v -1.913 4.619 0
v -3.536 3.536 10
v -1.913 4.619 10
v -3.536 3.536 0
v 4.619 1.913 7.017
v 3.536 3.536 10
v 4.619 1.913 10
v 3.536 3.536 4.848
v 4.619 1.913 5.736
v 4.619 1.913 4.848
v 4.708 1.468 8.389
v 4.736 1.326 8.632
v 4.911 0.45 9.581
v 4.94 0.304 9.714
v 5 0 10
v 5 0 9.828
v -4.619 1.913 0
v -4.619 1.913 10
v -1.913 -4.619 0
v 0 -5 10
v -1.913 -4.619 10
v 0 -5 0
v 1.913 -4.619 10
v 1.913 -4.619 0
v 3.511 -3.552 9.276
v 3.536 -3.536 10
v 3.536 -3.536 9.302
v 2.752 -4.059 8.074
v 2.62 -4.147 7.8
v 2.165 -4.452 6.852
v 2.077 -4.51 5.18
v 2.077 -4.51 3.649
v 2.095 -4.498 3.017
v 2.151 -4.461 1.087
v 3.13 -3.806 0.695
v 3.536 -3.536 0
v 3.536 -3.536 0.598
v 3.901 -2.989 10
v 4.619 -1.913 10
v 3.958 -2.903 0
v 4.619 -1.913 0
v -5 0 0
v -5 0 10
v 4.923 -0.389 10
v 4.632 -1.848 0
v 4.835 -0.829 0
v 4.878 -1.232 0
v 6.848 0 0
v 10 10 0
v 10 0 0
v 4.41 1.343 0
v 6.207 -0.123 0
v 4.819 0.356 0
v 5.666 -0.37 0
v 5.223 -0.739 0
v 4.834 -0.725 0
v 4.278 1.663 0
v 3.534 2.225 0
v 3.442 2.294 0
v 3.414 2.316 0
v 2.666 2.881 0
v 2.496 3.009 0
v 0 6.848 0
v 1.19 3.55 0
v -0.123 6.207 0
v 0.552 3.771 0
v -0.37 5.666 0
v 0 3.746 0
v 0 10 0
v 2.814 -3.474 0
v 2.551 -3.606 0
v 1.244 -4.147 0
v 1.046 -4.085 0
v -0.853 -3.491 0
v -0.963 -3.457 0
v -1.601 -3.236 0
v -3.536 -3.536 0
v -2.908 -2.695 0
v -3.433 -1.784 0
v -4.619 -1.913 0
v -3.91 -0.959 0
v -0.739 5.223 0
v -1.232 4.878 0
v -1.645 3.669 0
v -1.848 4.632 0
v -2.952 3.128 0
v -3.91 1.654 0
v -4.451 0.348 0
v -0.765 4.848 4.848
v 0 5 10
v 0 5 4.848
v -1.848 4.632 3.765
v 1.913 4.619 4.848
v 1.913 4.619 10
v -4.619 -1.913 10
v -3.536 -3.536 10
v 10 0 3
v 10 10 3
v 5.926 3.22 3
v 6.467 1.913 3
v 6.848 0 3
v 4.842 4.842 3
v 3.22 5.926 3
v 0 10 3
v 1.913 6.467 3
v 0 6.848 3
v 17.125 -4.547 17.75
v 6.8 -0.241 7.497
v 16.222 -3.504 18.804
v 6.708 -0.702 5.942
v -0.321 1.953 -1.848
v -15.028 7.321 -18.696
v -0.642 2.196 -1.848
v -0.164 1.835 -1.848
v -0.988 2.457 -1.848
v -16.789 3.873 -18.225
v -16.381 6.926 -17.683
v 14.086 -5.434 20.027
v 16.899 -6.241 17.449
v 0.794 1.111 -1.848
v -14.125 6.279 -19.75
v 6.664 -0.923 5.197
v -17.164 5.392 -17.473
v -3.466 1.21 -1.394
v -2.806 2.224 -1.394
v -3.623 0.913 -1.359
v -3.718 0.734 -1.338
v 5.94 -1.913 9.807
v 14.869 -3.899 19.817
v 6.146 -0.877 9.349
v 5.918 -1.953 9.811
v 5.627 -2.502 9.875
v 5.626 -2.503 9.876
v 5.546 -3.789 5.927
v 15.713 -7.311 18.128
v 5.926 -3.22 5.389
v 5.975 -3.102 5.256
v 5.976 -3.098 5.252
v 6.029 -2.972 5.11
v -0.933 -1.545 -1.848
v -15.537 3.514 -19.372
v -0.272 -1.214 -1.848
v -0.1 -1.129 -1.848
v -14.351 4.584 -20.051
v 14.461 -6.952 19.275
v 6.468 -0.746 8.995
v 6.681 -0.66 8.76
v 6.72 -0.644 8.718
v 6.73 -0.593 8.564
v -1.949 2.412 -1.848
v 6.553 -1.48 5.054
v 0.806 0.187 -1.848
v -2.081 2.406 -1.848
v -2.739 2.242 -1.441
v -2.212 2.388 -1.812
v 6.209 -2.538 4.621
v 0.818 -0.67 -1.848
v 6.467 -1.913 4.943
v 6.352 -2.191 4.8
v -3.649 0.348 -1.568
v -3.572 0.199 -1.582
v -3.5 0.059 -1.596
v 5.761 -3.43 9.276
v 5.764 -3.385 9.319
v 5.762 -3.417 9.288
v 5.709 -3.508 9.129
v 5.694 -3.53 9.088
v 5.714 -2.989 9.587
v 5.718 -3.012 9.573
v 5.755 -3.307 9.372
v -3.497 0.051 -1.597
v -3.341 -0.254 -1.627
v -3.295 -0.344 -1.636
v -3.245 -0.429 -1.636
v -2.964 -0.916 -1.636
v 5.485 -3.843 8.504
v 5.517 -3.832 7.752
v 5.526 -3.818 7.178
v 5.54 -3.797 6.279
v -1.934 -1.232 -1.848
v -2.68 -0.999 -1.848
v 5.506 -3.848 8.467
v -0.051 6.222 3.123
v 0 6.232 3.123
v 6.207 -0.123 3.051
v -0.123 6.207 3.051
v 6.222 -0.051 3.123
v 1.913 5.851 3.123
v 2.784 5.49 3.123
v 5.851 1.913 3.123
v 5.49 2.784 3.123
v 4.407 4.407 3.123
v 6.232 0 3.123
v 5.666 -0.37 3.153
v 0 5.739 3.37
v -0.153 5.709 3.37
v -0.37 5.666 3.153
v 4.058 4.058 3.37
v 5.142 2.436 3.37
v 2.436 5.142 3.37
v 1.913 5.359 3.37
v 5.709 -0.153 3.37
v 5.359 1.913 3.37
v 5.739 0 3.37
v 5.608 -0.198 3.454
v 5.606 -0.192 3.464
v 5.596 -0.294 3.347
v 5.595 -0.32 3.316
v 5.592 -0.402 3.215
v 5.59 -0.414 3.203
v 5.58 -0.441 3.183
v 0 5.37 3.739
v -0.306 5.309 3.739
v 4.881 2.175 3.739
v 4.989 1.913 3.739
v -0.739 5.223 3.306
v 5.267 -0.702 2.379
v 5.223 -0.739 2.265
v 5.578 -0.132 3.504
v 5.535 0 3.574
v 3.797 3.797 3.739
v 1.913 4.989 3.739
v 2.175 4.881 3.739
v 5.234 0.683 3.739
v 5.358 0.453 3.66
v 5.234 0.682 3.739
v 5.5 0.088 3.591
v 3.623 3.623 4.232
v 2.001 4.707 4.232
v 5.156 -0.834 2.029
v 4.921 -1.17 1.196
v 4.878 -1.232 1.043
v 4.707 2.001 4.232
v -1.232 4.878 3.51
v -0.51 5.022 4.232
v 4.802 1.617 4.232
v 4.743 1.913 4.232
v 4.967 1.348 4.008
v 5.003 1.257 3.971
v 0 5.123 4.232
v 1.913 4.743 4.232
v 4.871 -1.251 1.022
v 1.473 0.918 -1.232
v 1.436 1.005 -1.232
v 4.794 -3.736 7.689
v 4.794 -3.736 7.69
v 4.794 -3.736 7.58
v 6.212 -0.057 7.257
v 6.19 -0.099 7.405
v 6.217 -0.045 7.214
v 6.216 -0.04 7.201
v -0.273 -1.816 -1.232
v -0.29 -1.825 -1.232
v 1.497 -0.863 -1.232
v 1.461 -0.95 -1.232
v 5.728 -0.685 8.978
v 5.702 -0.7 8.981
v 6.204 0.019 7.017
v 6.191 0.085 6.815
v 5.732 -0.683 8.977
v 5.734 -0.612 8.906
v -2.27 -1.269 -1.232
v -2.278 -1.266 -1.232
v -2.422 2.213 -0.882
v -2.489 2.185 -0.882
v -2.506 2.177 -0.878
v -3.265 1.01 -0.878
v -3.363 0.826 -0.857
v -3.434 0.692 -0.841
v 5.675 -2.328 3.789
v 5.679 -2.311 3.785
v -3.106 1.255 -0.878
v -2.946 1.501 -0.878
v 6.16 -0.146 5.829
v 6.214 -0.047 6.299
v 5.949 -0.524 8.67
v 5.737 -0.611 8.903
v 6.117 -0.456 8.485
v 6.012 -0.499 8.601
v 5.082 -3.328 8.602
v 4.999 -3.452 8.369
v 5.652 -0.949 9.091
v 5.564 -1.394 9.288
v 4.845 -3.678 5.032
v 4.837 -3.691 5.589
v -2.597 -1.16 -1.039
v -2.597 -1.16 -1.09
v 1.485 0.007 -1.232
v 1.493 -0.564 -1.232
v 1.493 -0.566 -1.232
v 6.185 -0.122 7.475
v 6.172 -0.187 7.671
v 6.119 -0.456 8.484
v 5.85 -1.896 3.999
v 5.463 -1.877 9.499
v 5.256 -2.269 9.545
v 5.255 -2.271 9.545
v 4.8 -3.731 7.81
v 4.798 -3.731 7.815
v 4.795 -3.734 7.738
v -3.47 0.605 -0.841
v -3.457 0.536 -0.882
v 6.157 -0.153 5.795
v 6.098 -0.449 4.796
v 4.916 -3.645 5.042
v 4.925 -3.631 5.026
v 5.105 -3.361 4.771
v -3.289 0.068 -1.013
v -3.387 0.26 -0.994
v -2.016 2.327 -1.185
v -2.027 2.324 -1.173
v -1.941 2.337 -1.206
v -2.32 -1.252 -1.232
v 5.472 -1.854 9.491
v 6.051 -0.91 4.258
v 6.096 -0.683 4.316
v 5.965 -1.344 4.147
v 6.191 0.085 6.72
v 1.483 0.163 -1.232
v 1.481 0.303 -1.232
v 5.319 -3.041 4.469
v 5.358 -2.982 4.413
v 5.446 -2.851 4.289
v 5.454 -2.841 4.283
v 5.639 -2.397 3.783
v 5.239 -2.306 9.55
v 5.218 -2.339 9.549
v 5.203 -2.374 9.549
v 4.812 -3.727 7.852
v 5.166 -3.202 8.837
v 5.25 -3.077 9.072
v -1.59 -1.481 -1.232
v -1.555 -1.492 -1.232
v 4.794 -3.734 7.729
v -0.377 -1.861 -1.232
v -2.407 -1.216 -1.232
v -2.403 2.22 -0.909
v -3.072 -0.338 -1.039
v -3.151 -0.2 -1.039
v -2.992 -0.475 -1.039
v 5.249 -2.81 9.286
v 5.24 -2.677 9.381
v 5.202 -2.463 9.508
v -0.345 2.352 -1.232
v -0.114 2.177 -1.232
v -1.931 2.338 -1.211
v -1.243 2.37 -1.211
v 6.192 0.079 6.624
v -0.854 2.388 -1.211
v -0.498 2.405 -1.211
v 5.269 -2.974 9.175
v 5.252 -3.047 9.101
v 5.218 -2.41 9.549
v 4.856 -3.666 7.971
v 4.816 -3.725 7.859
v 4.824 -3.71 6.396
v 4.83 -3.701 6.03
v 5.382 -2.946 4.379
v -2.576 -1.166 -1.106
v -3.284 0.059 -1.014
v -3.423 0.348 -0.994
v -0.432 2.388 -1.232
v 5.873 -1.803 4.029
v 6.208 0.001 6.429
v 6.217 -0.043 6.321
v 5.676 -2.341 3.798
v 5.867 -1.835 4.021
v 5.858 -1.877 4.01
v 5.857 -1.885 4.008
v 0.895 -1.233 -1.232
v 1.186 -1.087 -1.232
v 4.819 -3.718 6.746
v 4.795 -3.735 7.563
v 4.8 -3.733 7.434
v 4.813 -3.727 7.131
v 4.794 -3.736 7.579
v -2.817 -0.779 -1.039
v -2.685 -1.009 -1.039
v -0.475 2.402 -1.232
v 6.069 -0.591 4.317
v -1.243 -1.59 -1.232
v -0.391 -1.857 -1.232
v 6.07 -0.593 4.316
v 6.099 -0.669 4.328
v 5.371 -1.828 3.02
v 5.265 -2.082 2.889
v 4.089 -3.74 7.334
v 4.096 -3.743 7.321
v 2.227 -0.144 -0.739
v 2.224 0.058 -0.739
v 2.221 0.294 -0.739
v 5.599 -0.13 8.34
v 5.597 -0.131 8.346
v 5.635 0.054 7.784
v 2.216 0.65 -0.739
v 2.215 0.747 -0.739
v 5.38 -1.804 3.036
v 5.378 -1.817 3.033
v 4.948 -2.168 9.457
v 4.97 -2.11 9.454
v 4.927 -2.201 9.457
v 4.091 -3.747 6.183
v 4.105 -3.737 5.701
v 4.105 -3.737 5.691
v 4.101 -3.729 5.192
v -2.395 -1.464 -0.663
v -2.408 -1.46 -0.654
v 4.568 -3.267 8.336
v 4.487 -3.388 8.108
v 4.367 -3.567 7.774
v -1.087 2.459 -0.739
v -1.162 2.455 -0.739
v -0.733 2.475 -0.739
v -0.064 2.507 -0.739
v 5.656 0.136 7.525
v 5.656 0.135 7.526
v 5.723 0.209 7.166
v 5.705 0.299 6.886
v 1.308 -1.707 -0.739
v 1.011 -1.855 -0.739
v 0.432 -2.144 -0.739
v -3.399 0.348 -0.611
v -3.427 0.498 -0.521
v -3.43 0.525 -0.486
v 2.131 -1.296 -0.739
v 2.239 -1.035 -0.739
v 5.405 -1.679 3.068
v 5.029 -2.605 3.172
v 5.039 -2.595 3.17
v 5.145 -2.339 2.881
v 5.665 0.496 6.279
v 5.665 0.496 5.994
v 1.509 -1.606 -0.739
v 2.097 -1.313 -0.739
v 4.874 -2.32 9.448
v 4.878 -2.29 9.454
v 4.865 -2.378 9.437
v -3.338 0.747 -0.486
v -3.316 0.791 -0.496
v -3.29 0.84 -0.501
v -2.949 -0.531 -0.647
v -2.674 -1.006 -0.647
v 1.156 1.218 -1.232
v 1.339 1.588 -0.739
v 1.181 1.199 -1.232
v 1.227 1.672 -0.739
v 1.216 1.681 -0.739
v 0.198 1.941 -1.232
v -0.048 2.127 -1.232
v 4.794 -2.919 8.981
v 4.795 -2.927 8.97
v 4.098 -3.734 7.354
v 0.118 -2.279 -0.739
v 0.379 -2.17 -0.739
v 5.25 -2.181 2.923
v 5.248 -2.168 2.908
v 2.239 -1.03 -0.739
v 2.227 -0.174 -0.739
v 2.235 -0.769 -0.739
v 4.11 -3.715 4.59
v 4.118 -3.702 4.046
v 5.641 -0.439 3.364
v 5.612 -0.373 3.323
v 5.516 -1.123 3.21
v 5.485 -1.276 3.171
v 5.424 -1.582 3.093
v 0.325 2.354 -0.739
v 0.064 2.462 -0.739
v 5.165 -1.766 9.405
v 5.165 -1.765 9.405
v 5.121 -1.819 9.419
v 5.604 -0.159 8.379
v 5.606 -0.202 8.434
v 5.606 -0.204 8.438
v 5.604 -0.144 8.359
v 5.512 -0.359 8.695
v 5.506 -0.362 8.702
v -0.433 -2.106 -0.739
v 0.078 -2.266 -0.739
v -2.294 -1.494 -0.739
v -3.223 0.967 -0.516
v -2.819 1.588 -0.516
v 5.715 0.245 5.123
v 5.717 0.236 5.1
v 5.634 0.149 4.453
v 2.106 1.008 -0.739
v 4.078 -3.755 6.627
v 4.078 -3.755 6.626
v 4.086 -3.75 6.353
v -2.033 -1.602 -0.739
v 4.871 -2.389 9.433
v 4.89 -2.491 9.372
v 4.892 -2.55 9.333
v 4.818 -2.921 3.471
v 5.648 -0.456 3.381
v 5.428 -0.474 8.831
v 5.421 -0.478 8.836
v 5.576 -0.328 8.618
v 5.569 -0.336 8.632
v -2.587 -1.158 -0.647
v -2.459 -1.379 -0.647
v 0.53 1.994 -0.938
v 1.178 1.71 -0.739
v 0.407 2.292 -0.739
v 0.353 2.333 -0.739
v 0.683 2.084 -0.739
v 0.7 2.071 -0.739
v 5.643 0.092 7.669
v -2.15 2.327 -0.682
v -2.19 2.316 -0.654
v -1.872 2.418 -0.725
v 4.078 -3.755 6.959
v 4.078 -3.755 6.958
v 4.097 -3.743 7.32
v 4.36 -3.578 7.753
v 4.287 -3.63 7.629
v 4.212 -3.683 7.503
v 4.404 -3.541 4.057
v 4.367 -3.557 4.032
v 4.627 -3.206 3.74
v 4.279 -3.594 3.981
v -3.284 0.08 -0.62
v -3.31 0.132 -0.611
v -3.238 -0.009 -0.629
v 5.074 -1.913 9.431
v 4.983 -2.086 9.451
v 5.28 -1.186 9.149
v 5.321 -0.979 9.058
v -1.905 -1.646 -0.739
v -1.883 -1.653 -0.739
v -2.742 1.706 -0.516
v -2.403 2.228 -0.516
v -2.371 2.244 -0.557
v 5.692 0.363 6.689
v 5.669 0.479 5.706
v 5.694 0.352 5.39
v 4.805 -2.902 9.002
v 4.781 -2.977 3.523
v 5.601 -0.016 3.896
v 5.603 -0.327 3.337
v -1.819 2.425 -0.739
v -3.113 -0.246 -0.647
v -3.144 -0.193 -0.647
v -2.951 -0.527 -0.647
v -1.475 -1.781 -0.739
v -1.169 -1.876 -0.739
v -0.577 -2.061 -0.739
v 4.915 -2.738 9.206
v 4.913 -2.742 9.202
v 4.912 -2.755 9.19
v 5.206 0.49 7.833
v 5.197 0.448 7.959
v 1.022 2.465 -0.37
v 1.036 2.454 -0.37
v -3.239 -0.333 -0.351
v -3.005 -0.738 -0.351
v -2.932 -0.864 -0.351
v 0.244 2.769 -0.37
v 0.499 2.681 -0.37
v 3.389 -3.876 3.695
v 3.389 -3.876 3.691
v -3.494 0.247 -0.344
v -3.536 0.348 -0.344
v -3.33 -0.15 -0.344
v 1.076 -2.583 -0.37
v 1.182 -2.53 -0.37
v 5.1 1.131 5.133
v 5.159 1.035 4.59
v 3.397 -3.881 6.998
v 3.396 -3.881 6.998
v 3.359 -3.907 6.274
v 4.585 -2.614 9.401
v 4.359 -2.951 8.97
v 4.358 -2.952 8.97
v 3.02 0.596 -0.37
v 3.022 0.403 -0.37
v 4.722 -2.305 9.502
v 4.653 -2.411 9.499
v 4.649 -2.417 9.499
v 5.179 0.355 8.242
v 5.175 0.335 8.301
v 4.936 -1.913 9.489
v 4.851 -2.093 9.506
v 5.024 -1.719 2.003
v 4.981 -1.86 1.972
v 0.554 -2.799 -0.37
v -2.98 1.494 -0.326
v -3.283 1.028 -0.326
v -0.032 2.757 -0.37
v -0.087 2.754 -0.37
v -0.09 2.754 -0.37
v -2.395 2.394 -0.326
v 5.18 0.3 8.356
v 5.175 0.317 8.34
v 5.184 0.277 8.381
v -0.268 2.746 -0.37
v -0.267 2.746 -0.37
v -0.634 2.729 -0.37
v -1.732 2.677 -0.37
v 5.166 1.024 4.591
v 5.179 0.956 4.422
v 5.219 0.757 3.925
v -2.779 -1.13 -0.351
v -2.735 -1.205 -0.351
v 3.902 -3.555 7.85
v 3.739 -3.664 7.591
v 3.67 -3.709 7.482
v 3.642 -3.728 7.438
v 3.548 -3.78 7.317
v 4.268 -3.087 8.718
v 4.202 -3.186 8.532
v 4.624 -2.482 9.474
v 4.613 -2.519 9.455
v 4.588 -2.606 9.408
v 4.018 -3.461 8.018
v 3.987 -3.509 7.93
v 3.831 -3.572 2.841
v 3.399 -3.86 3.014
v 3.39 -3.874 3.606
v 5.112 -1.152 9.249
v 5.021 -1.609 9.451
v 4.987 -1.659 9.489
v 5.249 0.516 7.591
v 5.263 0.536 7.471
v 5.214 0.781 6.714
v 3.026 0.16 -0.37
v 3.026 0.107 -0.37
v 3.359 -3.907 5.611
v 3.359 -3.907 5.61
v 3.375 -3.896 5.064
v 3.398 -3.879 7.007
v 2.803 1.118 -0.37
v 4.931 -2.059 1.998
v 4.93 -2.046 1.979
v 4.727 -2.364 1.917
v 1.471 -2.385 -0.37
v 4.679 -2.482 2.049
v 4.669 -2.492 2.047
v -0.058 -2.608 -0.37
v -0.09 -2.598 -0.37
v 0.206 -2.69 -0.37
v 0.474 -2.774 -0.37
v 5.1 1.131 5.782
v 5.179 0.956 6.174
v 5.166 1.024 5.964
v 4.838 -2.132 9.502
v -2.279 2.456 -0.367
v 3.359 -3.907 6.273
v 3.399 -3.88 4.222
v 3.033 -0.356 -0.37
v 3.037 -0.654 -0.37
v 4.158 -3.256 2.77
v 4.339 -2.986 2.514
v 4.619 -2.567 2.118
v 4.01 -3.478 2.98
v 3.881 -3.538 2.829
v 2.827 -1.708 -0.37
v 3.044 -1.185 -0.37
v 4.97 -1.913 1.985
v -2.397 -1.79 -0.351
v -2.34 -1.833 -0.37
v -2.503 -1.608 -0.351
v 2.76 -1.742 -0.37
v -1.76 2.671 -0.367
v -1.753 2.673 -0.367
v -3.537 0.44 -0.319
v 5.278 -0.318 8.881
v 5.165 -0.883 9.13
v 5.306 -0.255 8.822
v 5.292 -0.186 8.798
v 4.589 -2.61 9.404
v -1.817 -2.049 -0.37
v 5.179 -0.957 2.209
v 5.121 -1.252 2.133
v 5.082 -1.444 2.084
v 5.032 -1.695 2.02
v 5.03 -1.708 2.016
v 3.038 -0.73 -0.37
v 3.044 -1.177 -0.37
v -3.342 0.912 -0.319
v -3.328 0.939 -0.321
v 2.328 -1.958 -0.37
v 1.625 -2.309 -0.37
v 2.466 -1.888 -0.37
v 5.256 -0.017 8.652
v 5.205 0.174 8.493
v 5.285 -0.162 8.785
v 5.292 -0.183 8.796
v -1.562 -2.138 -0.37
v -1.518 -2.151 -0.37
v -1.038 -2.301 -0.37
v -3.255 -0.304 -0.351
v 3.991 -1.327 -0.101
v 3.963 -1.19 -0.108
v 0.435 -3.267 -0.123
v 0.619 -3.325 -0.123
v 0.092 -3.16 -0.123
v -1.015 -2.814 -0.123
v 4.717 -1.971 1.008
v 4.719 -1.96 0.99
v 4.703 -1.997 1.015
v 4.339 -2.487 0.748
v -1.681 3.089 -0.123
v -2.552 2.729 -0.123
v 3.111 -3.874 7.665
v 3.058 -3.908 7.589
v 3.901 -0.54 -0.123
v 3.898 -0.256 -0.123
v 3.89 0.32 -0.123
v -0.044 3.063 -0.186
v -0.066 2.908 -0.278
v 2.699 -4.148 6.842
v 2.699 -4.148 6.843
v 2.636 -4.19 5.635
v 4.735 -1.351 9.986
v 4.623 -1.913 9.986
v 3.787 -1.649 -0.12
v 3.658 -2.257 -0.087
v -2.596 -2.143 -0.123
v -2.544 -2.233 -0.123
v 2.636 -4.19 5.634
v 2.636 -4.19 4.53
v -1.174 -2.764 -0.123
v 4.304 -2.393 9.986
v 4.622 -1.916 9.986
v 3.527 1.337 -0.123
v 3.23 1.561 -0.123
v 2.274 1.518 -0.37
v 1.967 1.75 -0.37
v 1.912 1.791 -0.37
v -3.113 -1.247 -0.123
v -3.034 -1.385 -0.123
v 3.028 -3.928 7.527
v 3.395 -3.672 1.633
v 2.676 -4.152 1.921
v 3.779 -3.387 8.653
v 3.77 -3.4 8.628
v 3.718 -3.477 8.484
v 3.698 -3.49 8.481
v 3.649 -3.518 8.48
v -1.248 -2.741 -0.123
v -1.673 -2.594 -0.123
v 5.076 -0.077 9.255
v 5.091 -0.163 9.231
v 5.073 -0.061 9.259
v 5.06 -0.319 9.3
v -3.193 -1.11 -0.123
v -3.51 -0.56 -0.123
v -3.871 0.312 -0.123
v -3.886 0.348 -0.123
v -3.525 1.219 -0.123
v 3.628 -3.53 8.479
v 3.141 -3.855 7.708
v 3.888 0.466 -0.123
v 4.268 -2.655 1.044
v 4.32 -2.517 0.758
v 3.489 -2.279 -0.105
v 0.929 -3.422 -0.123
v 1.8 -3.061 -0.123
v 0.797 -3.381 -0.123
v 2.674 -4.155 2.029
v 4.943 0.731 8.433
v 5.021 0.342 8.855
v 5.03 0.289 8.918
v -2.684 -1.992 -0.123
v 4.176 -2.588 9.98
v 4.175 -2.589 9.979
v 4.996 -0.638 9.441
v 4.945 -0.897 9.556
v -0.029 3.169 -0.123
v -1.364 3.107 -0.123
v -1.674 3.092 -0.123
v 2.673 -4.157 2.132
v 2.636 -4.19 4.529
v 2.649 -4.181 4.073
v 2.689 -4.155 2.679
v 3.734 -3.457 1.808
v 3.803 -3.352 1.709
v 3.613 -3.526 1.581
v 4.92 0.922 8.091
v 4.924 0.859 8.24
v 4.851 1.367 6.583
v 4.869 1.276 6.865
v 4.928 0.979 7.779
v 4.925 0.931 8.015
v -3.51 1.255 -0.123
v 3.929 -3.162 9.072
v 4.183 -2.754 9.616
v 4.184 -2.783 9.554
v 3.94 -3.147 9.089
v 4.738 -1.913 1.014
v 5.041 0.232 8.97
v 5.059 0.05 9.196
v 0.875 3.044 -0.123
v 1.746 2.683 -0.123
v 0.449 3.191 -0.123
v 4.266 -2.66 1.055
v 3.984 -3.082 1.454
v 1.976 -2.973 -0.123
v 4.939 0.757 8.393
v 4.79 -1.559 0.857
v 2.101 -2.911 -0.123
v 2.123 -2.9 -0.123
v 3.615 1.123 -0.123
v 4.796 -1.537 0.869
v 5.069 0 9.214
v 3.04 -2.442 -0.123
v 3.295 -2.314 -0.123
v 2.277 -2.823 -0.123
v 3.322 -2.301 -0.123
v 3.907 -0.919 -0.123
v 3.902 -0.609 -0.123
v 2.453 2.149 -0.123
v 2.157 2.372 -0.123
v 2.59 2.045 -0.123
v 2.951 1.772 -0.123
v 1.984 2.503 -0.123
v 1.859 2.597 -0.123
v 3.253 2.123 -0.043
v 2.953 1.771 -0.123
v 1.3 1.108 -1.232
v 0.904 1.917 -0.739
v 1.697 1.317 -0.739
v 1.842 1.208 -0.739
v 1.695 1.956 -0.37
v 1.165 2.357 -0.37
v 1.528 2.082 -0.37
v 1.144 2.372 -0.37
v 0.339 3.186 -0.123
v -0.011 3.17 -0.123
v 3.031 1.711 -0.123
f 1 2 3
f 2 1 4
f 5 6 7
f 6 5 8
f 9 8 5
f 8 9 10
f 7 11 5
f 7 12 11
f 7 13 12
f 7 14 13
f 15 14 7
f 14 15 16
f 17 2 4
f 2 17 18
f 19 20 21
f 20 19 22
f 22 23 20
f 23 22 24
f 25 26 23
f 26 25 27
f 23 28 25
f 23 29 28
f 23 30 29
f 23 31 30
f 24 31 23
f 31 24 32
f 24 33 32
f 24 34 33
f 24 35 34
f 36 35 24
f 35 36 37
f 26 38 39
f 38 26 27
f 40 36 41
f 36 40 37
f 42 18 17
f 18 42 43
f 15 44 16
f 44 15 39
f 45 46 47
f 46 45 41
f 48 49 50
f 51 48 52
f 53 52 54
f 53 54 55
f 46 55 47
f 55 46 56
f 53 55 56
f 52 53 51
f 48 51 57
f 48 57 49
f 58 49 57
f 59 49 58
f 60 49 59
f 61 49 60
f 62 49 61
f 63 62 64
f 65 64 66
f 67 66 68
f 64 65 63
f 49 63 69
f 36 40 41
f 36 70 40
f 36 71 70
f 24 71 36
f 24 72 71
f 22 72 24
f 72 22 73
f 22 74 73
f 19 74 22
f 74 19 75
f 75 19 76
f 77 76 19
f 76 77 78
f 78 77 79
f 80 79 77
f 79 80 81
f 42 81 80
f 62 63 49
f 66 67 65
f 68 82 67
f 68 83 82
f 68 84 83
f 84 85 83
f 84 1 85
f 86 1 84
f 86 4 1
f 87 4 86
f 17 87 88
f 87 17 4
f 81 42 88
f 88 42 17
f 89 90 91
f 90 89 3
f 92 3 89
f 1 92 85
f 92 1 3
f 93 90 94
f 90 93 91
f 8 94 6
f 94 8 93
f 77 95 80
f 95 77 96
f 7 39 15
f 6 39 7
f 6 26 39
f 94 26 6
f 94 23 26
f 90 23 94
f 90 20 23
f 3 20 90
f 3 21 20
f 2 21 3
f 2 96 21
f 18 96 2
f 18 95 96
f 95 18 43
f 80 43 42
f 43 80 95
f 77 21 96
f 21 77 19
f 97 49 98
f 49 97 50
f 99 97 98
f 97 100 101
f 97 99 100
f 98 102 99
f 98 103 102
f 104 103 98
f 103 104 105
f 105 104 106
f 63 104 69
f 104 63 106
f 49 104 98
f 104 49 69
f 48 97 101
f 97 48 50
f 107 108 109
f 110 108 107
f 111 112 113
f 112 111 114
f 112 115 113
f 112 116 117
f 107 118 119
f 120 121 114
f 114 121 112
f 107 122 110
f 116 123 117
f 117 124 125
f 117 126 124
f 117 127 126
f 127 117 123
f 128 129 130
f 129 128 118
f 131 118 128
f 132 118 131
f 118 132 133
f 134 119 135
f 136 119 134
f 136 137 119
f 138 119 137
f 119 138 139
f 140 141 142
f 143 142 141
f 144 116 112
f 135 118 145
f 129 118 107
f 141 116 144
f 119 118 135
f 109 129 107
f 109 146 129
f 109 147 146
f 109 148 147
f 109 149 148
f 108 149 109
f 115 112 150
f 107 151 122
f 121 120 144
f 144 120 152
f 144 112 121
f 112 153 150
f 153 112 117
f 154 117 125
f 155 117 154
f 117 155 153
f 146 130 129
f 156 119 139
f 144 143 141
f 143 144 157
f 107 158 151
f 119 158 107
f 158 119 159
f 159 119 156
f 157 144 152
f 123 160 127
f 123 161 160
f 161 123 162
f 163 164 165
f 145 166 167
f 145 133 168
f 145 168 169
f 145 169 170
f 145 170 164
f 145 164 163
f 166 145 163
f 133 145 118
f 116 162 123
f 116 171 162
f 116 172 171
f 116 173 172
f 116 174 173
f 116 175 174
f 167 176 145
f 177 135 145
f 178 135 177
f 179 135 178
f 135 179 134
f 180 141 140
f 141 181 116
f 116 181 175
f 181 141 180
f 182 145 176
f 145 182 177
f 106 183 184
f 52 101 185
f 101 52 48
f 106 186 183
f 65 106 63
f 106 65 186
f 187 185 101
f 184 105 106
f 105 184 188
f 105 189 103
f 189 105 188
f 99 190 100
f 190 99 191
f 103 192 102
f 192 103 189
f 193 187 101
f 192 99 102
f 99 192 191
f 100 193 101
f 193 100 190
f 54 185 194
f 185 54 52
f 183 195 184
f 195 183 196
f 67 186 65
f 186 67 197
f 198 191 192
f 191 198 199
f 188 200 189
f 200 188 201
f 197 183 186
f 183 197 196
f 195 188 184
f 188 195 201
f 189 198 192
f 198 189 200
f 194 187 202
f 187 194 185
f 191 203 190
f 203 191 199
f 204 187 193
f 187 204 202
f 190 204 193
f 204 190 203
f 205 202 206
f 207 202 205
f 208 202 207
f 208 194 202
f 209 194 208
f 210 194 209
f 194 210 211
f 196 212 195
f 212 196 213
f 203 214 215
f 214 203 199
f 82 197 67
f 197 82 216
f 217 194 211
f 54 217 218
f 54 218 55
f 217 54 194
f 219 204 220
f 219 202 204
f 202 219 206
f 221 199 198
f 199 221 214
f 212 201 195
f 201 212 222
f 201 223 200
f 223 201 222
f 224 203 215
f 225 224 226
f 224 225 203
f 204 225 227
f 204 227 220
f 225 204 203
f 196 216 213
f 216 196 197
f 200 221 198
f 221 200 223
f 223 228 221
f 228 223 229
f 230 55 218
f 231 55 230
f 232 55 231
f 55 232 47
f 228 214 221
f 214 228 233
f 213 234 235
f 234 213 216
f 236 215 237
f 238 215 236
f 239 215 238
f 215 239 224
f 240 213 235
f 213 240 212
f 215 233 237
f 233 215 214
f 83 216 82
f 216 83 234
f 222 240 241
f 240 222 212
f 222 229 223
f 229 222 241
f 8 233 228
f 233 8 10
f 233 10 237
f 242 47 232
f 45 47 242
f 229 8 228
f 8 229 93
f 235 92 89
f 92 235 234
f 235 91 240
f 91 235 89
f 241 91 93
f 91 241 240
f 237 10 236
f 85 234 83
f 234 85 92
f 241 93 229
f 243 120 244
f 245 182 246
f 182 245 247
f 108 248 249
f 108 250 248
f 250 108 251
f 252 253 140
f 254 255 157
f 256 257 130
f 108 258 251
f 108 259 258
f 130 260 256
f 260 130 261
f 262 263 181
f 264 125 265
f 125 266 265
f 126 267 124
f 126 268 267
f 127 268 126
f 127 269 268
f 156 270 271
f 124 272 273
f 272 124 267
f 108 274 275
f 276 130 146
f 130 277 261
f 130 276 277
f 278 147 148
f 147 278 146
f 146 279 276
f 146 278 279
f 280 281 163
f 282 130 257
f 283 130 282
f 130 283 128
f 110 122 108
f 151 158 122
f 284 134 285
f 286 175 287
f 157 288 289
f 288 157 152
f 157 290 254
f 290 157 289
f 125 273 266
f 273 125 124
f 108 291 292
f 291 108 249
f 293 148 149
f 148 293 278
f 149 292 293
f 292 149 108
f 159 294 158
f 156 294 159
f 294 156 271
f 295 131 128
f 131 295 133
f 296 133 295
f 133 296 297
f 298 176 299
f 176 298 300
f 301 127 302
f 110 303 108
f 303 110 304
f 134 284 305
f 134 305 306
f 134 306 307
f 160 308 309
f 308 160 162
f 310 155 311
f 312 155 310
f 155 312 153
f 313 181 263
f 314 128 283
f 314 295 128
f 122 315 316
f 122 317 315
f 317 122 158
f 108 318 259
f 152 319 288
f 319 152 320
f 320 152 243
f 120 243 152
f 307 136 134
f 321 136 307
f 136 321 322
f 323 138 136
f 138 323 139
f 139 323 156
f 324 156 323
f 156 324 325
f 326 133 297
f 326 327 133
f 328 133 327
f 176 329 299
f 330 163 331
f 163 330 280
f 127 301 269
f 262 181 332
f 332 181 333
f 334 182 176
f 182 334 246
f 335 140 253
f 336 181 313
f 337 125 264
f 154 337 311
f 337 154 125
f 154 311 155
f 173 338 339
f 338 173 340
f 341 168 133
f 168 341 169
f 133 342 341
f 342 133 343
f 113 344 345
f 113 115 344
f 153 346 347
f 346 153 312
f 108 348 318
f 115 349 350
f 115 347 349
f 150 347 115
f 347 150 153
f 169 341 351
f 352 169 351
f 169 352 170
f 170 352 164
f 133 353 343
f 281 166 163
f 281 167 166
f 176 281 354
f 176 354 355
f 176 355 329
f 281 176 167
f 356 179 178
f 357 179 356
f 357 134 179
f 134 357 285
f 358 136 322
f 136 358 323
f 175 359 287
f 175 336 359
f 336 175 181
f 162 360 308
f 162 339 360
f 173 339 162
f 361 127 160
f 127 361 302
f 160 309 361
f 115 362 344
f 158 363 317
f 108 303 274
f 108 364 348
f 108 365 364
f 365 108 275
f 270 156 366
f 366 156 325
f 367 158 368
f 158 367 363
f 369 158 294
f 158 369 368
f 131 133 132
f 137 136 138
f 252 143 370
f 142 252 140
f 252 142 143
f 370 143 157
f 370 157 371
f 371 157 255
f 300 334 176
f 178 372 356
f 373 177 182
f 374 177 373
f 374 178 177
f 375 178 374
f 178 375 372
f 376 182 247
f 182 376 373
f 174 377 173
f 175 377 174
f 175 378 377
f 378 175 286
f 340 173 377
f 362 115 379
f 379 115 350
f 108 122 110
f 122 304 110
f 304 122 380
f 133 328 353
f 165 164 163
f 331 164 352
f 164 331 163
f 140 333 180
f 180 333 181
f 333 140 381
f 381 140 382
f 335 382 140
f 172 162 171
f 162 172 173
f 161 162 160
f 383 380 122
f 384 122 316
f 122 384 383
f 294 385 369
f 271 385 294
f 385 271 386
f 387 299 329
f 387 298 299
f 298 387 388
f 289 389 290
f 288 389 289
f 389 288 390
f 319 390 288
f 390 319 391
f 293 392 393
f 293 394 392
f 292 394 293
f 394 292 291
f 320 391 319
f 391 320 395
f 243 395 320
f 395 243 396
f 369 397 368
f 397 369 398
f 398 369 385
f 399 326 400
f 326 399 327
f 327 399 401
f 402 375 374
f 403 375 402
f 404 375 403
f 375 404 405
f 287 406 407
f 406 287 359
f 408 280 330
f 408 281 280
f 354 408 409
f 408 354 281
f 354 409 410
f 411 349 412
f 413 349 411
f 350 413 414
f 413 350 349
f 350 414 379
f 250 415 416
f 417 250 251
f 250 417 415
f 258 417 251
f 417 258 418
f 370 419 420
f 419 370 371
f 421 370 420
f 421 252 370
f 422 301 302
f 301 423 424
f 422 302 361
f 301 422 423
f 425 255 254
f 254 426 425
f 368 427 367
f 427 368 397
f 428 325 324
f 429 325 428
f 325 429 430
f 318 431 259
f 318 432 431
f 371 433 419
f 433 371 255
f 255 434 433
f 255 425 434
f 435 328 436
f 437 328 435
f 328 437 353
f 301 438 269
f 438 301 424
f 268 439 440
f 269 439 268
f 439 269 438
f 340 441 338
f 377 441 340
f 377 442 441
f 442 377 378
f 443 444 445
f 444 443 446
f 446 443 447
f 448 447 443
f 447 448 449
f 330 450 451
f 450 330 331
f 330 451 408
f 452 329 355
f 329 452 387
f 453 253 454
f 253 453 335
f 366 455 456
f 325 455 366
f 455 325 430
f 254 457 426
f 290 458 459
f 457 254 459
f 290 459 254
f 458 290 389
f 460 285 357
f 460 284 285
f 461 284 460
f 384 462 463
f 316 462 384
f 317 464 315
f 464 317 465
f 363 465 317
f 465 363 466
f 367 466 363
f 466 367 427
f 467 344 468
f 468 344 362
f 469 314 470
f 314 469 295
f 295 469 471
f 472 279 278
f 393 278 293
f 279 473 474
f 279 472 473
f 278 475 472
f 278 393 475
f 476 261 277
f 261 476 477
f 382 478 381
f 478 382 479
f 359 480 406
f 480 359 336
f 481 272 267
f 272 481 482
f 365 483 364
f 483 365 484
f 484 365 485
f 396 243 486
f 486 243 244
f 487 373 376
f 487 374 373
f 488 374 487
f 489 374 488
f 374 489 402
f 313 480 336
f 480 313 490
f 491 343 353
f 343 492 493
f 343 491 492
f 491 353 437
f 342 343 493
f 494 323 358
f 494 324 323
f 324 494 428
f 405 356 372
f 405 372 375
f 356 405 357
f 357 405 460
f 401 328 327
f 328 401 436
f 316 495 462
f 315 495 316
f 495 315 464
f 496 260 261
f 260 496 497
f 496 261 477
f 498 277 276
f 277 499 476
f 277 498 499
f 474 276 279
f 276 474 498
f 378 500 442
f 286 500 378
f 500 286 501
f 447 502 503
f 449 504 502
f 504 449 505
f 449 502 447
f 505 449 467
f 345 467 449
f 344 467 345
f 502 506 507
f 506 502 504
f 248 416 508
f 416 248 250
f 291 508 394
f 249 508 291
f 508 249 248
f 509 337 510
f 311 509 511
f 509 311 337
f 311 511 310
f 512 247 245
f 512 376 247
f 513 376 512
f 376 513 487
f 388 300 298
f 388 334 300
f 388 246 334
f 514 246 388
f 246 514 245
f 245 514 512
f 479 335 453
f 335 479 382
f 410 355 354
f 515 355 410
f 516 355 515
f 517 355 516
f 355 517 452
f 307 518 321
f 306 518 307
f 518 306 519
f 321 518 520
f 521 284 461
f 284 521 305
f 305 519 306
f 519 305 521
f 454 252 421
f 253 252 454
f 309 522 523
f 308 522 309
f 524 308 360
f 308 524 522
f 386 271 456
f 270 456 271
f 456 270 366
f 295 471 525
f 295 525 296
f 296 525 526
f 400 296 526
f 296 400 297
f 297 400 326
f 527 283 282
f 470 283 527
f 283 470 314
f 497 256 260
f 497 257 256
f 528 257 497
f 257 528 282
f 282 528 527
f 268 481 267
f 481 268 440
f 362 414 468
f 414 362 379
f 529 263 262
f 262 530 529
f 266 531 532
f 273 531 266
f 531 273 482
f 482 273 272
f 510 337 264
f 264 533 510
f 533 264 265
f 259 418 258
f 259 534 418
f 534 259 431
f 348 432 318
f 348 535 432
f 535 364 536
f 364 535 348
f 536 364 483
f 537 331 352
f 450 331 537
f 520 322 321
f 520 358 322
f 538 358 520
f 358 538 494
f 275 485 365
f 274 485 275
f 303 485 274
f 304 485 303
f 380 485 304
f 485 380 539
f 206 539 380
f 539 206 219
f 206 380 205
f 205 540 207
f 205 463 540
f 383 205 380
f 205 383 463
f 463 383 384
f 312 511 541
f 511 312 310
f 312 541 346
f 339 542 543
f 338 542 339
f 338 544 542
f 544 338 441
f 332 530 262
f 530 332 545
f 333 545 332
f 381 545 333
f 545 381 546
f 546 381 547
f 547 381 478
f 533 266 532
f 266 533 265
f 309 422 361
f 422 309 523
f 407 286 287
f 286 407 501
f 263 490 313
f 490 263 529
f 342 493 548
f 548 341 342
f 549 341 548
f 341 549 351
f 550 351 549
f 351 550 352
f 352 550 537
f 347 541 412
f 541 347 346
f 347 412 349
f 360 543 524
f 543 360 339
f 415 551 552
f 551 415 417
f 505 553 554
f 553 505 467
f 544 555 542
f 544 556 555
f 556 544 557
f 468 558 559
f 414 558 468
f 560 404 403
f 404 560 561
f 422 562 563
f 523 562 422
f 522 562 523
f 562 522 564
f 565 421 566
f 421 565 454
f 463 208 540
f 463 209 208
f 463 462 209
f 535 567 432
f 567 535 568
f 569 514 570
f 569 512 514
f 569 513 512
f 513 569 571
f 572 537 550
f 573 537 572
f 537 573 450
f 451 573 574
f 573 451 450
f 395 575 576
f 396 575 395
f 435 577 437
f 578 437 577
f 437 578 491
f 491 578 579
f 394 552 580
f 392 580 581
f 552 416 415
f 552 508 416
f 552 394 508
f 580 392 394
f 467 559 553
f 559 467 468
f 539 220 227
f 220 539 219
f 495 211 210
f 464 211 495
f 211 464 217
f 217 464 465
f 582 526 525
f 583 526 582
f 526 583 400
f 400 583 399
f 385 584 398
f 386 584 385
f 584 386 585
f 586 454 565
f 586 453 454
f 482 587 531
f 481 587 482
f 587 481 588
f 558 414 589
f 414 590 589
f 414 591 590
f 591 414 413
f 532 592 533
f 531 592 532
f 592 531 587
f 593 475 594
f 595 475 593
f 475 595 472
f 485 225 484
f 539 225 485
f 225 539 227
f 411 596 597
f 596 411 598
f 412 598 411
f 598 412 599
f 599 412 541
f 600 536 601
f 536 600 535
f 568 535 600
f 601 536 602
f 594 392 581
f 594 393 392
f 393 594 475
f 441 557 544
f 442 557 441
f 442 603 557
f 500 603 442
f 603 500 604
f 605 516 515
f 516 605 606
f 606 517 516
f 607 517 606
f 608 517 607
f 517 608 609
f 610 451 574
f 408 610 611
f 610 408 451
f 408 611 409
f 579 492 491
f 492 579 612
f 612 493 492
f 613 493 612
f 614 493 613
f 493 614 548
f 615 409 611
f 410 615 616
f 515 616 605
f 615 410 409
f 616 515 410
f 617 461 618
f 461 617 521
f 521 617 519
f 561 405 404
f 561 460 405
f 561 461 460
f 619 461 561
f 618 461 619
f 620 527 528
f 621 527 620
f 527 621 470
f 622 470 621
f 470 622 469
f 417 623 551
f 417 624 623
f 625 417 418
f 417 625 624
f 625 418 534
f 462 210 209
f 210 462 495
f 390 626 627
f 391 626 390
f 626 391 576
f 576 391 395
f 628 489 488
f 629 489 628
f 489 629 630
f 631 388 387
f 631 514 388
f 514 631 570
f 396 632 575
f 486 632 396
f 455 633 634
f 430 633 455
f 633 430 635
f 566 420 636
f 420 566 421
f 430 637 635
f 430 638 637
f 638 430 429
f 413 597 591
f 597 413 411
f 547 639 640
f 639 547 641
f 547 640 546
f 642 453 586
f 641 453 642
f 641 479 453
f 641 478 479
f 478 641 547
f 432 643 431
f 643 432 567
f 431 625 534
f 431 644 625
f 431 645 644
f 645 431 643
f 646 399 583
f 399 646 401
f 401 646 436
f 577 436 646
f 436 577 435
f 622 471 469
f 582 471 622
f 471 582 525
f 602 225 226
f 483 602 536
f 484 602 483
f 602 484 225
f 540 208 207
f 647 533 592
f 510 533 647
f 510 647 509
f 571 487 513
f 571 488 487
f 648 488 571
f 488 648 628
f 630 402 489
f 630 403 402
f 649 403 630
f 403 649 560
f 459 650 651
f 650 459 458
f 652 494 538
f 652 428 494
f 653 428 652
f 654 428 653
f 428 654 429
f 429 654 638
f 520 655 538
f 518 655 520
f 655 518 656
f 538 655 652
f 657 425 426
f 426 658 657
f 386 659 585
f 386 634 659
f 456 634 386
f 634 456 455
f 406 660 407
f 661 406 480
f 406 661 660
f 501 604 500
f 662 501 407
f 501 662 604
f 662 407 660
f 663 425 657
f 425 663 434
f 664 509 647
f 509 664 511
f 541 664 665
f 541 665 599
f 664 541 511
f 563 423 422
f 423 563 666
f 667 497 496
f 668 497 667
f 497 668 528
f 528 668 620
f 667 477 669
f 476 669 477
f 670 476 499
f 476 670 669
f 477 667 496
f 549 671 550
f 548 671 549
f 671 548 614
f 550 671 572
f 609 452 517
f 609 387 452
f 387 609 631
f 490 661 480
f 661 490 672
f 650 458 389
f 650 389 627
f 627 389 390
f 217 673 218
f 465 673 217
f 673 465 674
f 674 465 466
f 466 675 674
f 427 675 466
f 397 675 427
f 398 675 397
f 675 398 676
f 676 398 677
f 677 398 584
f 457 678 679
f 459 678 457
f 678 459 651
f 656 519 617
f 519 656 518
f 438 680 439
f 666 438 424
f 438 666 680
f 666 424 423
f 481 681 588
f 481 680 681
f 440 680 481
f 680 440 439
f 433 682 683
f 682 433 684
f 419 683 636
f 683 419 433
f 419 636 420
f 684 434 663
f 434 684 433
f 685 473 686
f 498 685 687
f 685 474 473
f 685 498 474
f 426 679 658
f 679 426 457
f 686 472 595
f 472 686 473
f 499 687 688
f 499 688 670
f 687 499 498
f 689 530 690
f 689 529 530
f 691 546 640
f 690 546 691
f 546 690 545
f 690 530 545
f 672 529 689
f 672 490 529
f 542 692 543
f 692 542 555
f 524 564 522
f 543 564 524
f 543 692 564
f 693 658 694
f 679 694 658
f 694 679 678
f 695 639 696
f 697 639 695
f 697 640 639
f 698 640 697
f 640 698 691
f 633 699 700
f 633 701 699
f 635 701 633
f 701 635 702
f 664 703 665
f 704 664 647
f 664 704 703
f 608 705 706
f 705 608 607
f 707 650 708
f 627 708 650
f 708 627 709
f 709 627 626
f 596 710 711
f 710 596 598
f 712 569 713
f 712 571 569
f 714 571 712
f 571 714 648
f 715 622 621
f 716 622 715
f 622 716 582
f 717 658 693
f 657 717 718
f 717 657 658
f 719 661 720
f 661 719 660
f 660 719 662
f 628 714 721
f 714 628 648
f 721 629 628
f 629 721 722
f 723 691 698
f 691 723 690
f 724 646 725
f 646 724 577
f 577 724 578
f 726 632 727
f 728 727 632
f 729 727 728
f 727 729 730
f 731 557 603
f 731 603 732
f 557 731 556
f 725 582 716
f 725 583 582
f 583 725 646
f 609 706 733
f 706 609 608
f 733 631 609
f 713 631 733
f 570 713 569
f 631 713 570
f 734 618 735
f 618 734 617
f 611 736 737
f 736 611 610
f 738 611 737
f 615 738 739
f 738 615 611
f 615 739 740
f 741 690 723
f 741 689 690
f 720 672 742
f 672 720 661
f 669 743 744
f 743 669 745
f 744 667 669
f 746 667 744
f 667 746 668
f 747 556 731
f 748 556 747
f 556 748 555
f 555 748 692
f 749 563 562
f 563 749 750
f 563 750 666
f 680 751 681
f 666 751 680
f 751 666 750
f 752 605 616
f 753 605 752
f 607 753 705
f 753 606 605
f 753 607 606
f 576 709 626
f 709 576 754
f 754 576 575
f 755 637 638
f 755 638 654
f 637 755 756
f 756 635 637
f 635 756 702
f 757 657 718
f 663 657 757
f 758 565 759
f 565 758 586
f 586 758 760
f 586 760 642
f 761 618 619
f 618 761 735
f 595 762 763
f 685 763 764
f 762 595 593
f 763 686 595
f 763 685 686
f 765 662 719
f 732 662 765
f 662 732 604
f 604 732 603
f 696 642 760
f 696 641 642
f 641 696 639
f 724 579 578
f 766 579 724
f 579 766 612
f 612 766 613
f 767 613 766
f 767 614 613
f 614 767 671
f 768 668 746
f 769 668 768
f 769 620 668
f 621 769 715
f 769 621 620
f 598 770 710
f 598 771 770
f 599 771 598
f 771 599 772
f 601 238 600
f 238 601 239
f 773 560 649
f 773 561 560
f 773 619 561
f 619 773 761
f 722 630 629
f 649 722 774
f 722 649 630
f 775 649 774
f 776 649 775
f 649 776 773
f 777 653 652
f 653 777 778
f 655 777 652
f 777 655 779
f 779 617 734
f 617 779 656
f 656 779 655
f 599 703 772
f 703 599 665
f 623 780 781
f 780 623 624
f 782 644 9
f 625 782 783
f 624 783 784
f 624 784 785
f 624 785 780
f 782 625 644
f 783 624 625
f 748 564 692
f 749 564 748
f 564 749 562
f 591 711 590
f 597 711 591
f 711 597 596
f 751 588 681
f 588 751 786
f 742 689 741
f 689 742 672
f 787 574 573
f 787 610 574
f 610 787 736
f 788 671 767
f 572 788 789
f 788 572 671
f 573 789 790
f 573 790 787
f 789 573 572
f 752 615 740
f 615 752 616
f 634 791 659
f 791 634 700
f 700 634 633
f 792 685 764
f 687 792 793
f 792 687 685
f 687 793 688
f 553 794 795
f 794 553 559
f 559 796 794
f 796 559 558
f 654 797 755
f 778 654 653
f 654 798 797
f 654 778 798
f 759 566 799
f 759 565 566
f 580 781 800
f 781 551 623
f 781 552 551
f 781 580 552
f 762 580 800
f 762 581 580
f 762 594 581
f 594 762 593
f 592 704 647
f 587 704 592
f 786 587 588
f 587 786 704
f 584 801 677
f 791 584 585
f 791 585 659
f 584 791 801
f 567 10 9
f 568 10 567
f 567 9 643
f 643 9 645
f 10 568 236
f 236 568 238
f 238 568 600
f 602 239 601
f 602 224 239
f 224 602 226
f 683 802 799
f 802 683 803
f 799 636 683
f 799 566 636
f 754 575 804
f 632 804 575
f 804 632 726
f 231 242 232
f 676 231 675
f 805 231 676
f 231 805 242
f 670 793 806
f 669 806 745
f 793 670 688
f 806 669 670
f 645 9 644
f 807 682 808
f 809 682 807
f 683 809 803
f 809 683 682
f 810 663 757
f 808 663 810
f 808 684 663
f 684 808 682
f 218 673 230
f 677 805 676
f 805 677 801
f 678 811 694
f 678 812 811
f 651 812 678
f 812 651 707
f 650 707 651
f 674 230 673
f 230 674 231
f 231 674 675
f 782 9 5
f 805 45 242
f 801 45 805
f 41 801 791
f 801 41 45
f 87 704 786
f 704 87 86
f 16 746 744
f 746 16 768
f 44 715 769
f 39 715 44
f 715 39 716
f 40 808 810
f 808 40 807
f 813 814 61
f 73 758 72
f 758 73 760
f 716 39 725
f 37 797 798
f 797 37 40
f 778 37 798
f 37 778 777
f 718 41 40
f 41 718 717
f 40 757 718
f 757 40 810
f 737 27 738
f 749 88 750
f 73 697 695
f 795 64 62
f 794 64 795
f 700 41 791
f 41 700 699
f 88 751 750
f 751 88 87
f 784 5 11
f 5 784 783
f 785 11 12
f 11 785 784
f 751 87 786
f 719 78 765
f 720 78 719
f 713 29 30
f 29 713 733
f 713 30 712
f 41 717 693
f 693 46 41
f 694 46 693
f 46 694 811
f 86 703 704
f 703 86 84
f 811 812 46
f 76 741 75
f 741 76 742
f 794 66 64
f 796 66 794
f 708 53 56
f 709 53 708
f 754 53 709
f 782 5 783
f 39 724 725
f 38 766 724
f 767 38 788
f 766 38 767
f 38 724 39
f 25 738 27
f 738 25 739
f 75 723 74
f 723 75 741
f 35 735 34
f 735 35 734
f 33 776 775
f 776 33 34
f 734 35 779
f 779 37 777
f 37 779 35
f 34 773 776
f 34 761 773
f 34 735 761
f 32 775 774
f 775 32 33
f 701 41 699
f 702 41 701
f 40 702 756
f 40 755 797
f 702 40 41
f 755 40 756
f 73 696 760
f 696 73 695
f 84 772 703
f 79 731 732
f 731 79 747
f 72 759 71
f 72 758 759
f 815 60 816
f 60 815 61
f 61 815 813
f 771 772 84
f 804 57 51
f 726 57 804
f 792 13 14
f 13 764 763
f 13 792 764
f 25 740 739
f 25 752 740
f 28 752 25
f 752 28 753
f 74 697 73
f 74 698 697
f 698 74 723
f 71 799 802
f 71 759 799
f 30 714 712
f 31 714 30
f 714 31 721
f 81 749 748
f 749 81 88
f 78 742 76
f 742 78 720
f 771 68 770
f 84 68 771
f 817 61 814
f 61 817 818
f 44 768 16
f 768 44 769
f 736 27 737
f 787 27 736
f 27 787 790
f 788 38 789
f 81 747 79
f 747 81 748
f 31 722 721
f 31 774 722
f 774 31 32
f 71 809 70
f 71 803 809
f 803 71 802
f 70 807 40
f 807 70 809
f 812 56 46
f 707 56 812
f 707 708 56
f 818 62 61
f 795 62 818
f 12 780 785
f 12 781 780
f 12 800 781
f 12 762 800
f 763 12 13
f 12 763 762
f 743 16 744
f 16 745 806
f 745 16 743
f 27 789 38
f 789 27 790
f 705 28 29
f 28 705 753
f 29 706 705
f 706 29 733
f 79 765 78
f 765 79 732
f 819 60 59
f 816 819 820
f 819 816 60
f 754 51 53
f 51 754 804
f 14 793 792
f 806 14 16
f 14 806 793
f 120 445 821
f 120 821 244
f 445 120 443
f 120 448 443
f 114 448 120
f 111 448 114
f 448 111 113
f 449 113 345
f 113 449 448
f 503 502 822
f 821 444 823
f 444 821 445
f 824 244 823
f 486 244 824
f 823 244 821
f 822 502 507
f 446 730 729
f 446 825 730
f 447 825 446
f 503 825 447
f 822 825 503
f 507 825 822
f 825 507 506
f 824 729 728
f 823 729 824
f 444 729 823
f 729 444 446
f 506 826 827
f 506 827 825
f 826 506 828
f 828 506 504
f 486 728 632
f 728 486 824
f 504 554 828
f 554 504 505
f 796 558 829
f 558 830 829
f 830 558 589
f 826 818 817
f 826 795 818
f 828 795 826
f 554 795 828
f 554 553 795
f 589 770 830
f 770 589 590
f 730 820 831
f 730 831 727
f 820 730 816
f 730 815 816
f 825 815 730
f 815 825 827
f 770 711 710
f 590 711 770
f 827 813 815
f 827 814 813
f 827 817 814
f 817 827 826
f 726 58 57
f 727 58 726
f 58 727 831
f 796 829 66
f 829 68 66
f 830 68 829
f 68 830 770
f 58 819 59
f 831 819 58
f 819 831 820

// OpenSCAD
// Fillet function
// Src here: https://github.com/clothbot/utilities

module fillet(r=1.0,steps=3,include=true) {
  if(include) for (k=[0:$children-1]) {
	children(k);
  }
  for (i=[0:$children-2] ) {
    for(j=[i+1:$children-1] ) {
	fillet_two(r=r,steps=steps) {
	  children(i);
	  children(j);
	  intersection() {
		children(i);
		children(j);
	  }
	}
    }
  }
}

module fillet_two(r=1.0,steps=3) {
  for(step=[1:steps]) {
	hull() {
	  intersection() {
		children(0);
		offset_3d(r=r*step/steps) children(2);
	  }
	  intersection() {
		children(1);
		offset_3d(r=r*(steps-step+1)/steps) children(2);
	  }
	}
  }
}

module offset_3d(r=1.0) {
  for(k=[0:$children-1]) minkowski() {
	children(k);
	sphere(r=r,$fn=8);
  }
}

fillet(r=2,steps=5) {
	cylinder(r=5,h=10);
	cube([10,10,3]);
	rotate([30,30,30]) cylinder(r=2.0,h=50,center=true);
}
